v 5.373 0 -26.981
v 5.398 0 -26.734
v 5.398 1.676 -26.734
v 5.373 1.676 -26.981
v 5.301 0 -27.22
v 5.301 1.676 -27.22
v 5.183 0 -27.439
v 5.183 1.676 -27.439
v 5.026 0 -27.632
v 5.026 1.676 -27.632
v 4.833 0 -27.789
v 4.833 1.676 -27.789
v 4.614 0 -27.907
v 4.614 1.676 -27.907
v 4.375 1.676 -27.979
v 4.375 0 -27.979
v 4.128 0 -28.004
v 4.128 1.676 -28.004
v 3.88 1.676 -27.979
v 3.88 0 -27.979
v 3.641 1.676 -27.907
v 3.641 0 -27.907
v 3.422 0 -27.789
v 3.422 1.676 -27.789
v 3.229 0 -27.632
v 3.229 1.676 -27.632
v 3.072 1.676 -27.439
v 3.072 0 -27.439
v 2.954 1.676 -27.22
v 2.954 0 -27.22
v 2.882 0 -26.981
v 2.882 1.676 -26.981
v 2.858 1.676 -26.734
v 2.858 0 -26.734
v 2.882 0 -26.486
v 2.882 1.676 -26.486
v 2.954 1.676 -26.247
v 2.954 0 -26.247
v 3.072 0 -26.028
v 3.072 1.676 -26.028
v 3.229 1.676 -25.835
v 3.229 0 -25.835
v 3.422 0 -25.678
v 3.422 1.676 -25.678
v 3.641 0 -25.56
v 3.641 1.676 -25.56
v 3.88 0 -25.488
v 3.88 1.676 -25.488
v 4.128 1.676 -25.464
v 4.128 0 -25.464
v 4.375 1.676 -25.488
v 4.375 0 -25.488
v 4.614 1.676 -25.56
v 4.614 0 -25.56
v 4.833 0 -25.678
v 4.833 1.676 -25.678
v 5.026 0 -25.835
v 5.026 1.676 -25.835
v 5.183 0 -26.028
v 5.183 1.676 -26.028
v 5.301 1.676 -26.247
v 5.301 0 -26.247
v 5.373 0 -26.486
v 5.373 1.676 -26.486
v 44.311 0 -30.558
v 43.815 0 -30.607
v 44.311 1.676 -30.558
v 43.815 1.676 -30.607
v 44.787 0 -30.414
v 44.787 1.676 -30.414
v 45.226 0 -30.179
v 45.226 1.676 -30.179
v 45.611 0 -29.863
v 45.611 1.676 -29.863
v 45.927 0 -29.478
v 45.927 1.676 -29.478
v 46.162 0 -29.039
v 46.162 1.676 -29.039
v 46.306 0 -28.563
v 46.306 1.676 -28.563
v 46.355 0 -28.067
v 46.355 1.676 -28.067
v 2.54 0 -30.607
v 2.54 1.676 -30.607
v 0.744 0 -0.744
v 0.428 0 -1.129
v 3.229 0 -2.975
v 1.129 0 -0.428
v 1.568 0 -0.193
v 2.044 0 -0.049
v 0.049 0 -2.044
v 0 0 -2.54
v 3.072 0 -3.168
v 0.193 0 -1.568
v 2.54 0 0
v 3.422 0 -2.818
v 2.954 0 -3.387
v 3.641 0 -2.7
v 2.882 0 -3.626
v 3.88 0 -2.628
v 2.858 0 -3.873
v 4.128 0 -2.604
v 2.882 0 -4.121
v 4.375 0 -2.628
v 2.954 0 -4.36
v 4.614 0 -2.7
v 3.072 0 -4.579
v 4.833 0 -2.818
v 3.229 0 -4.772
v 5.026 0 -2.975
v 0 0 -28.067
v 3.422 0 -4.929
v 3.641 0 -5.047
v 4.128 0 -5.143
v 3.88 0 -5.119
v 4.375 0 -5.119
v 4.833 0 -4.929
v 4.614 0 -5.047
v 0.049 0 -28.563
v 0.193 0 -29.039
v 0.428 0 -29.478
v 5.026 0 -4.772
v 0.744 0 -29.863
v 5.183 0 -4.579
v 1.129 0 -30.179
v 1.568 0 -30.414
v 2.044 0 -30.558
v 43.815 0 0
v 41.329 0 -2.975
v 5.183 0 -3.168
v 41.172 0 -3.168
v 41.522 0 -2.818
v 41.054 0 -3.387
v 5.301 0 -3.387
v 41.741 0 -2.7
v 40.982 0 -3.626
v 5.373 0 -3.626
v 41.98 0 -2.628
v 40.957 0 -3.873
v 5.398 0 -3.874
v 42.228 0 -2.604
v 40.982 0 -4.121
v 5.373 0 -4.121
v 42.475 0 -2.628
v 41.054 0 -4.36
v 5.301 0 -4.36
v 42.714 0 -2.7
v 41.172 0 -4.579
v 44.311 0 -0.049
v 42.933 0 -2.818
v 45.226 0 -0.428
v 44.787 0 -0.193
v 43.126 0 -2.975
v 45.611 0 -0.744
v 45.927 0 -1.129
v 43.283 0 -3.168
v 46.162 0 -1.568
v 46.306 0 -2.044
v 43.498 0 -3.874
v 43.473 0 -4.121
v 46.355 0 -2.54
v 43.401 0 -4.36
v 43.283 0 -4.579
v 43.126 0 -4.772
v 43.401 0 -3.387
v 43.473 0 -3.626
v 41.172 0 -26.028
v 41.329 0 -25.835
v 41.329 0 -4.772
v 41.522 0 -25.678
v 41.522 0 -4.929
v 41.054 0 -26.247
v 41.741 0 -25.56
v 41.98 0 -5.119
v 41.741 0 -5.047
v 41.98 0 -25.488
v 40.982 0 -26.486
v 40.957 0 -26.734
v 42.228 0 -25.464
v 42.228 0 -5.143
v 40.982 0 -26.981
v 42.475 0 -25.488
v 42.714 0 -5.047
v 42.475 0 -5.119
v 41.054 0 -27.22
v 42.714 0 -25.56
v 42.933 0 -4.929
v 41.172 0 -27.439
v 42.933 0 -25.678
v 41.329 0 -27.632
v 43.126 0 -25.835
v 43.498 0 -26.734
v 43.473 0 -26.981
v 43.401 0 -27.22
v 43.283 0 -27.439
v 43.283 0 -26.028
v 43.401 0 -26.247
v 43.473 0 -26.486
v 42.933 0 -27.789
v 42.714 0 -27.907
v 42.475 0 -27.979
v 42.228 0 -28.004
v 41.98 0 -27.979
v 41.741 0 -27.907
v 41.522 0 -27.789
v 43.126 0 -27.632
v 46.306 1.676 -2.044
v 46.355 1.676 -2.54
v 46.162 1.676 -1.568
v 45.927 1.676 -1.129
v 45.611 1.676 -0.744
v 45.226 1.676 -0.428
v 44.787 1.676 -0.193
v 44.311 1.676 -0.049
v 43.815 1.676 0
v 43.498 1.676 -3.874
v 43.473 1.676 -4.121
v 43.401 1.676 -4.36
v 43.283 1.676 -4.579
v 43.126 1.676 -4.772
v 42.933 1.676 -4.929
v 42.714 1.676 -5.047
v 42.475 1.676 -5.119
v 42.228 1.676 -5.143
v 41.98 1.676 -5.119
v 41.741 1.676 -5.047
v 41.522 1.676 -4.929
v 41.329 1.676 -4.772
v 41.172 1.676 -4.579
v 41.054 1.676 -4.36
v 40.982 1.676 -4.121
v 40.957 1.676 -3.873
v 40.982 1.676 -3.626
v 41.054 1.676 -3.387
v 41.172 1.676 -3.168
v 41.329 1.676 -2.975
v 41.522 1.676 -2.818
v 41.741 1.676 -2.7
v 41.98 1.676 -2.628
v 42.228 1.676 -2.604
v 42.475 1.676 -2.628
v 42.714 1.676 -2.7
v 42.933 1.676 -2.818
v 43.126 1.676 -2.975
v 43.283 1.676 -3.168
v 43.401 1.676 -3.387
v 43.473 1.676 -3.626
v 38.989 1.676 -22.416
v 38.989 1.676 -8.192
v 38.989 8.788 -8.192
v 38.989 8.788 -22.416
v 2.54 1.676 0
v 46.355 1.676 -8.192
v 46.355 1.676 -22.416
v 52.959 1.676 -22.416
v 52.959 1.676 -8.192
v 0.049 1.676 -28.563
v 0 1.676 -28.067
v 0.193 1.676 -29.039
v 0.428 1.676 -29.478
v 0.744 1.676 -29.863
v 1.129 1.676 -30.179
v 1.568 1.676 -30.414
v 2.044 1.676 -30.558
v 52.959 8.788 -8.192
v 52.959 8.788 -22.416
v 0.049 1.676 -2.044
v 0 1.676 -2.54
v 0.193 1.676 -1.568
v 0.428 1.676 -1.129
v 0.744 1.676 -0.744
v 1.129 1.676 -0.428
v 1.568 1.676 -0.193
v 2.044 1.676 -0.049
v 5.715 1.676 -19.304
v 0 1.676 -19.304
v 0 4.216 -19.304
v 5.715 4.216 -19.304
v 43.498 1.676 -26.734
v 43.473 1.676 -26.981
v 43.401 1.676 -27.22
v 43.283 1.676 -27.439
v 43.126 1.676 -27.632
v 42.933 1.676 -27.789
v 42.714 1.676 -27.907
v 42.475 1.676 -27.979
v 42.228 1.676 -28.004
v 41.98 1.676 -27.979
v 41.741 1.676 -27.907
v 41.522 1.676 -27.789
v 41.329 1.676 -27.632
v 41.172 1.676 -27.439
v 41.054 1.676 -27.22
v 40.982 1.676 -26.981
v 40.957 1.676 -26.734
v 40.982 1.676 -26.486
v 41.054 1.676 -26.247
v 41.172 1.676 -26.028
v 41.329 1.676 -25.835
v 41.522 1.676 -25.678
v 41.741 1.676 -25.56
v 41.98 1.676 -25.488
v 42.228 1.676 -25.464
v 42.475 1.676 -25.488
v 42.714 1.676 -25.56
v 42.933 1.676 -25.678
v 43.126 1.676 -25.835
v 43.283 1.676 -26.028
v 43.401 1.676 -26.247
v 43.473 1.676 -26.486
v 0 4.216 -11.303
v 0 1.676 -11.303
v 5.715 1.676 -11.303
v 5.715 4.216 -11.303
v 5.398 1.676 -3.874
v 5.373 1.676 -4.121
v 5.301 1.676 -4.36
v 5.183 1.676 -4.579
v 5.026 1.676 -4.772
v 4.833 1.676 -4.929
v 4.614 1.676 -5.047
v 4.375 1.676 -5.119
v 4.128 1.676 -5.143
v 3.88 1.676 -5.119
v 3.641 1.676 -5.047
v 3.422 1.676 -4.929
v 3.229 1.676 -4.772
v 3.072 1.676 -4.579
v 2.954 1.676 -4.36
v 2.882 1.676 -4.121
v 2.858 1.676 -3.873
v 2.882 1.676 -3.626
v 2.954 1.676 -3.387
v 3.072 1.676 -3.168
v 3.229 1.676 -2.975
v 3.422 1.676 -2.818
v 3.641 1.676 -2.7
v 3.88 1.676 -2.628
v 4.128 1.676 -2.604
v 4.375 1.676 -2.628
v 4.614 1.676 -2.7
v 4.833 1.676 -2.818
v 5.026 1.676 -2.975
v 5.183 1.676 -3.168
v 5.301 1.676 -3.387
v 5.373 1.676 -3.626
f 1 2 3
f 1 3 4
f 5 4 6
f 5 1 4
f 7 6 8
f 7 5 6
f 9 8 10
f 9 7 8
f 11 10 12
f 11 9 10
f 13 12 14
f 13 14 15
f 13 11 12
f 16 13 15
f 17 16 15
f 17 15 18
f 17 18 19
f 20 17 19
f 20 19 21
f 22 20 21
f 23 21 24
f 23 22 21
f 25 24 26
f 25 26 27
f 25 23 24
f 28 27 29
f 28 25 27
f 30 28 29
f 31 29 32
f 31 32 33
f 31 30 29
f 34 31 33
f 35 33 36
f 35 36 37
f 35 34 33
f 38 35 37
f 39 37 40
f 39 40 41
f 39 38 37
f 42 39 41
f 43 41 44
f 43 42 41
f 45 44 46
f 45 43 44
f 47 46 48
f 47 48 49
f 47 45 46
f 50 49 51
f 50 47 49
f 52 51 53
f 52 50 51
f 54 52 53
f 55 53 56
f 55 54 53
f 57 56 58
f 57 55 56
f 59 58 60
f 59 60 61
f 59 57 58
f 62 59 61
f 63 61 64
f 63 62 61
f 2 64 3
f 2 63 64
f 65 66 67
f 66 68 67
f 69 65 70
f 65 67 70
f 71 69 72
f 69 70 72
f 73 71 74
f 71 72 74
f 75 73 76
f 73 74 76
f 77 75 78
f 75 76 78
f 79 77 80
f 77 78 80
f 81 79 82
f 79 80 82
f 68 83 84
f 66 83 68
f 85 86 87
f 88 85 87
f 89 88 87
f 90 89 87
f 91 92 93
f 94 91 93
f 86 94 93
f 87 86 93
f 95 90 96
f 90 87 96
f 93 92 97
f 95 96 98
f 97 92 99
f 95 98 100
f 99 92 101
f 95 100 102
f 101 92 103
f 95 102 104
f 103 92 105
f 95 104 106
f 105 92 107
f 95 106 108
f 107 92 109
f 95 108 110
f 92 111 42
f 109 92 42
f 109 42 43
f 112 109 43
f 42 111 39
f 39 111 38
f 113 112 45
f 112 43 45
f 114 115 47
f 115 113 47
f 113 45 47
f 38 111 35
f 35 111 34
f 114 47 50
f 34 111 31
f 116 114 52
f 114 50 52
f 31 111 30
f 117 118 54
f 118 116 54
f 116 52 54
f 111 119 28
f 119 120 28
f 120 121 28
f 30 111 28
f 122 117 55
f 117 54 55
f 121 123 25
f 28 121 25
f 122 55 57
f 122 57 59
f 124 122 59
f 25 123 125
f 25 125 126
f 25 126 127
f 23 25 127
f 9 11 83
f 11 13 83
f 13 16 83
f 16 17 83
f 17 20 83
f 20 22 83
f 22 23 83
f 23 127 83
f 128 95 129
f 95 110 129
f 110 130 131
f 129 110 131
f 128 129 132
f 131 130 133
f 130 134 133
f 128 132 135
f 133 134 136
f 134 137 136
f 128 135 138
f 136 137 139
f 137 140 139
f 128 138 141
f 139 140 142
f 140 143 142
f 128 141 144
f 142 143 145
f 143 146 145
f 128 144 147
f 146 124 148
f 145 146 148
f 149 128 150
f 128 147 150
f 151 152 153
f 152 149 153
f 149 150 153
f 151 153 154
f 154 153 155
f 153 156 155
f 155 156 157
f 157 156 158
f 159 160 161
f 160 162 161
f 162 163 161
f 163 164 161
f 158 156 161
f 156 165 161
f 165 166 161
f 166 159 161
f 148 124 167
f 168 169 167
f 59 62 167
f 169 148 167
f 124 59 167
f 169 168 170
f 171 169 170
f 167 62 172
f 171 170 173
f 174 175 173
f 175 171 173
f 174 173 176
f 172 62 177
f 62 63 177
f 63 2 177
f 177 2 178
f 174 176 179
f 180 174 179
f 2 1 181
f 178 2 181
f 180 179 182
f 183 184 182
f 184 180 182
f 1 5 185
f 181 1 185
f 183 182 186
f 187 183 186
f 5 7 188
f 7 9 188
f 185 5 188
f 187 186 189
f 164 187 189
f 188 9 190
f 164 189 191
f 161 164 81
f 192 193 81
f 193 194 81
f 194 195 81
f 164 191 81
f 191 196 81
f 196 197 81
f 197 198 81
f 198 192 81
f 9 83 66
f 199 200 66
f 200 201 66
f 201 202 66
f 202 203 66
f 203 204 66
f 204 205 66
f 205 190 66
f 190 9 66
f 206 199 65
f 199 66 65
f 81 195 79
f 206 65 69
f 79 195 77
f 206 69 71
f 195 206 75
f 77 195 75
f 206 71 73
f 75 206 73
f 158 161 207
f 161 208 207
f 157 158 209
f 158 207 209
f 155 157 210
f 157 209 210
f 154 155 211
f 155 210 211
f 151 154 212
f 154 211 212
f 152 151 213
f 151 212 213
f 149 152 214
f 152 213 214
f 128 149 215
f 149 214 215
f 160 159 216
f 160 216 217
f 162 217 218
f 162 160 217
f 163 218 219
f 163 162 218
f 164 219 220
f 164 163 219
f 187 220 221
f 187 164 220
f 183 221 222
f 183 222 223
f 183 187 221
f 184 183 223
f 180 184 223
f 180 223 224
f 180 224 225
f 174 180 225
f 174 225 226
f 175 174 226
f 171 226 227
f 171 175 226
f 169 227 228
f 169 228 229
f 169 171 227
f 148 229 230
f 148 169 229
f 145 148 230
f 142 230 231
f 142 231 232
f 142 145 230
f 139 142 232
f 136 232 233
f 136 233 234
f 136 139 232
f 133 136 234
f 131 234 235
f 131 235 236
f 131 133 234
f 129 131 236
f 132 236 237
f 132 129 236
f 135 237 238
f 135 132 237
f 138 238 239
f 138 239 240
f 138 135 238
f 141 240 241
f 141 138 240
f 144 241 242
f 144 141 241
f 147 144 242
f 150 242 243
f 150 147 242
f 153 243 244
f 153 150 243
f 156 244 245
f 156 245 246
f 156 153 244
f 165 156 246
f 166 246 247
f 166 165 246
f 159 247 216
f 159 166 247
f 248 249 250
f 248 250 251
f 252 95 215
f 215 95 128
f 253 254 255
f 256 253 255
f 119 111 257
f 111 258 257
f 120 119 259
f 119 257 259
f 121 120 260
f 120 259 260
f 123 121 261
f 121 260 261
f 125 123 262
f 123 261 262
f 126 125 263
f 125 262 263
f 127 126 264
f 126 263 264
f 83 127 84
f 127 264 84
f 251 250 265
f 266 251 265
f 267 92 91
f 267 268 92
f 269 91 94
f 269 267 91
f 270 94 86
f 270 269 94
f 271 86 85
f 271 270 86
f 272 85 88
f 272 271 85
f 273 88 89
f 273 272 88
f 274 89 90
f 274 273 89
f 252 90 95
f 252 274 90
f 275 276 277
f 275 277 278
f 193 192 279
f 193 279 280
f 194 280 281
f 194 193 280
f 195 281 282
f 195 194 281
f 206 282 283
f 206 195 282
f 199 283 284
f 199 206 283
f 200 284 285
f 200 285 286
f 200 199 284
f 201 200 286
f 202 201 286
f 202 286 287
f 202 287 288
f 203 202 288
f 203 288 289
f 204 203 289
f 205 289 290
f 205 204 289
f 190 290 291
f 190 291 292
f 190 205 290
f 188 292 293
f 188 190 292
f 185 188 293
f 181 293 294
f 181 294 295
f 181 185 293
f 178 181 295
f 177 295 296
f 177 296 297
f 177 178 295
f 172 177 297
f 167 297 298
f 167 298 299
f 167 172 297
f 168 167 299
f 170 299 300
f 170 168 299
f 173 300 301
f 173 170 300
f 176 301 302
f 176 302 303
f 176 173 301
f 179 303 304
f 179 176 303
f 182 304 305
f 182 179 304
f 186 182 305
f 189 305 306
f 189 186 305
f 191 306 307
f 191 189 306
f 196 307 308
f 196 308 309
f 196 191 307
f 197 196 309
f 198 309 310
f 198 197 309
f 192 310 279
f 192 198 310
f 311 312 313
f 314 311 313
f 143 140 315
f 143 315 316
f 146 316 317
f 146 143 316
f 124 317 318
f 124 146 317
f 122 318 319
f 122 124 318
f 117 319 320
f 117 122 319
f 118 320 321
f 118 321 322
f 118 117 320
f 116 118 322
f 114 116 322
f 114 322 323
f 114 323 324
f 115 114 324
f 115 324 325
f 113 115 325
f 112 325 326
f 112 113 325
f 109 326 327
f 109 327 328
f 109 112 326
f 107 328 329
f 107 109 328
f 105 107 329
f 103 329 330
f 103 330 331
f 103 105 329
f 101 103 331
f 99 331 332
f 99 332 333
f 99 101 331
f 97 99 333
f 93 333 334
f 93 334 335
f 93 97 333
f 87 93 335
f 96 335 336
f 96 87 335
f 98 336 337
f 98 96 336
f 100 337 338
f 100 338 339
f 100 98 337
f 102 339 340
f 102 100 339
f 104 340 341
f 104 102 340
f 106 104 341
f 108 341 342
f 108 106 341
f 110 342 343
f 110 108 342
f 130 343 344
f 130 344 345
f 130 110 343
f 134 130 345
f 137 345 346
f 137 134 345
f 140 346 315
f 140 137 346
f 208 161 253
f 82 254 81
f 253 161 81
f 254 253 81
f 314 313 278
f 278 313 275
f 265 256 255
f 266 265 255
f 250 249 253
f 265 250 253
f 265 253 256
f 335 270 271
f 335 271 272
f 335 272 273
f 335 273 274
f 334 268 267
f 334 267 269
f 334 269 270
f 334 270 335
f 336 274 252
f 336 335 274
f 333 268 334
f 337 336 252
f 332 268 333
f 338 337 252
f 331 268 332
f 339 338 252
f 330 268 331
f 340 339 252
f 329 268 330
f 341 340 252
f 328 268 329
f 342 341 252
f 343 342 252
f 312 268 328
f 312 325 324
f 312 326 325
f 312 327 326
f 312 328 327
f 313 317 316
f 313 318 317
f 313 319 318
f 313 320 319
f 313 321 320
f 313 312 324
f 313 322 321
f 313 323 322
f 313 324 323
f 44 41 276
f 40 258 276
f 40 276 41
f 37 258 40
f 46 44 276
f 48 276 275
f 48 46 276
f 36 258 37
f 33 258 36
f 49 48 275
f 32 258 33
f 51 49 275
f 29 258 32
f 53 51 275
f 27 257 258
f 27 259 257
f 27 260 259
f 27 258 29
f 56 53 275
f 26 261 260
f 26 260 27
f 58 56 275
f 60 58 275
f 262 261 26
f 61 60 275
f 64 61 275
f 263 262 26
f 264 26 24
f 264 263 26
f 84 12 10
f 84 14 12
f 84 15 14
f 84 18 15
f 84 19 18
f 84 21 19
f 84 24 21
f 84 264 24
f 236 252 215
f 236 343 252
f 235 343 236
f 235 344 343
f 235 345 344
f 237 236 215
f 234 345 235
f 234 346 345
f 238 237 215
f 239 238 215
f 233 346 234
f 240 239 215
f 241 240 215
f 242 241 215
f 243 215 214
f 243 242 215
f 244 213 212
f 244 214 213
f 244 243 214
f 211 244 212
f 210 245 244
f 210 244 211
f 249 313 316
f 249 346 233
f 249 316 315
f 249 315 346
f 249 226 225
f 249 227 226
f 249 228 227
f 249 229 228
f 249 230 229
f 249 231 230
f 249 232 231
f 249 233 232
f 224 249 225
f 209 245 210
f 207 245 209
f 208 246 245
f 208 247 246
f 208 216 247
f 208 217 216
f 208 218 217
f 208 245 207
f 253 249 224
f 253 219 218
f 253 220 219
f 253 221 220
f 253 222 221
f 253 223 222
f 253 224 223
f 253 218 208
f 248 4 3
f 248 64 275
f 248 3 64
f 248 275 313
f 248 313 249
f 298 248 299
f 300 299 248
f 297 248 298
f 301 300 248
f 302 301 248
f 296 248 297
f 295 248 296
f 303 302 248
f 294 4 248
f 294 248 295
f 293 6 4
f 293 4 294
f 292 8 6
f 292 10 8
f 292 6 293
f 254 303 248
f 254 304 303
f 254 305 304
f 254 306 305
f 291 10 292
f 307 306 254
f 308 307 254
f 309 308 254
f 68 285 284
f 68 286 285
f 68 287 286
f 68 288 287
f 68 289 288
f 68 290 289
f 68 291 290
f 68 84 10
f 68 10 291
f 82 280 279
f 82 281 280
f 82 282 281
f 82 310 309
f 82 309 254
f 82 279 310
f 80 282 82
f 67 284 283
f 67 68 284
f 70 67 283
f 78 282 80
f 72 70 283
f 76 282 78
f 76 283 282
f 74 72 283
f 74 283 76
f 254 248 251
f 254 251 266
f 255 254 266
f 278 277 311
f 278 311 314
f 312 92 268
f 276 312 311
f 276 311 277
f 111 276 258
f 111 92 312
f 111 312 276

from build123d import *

# Parameters (mm, degrees)
SKETCH1_W           = 46.355
SKETCH1_H           = 30.607
SKETCH1_R           = 1.27
BOSS_EXTRUDE1_DEPTH = 1.6764
SKETCH2_W           = 13.97
SKETCH2_H           = 14.224
BOSS_EXTRUDE2_DEPTH = 7.112
SKETCH3_W           = 5.715
SKETCH3_H           = 8.001
BOSS_EXTRUDE3_DEPTH = 2.54
FILLET1_R           = 2.54


with BuildPart() as part:
    # Sketch1 → Boss-Extrude1 (new body)
    with BuildSketch(Plane(origin=(0, 0, 0), x_dir=(1, 0, 0), z_dir=(0, 1, 0))):
        with Locations((23.1775, 15.3035)):
            Rectangle(SKETCH1_W, SKETCH1_H)
        with Locations((4.1275, 26.7335)):
            Circle(SKETCH1_R, mode=Mode.SUBTRACT)
        with Locations((42.2275, 26.7335)):
            Circle(SKETCH1_R, mode=Mode.SUBTRACT)
        with Locations((4.1275, 3.8735)):
            Circle(SKETCH1_R, mode=Mode.SUBTRACT)
        with Locations((42.2275, 3.8735)):
            Circle(SKETCH1_R, mode=Mode.SUBTRACT)
    extrude(amount=BOSS_EXTRUDE1_DEPTH)

    # Sketch2 → Boss-Extrude2 (add)
    with BuildSketch(Plane(origin=(0, 1.6764, 0), x_dir=(1, 0, 0), z_dir=(0, 1, 0))):
        with Locations((45.974, 15.3035)):
            Rectangle(SKETCH2_W, SKETCH2_H)
    extrude(amount=BOSS_EXTRUDE2_DEPTH)

    # Sketch3 → Boss-Extrude3 (add)
    with BuildSketch(Plane(origin=(0, 1.6764, 0), x_dir=(1, 0, 0), z_dir=(0, 1, 0))):
        with Locations((2.8575, 15.3035)):
            Rectangle(SKETCH3_W, SKETCH3_H)
    extrude(amount=BOSS_EXTRUDE3_DEPTH)

    # Fillet1
    fillet1_edges = [part.edges().sort_by_distance(p)[0] for p in [
        (0, 0.8382, -30.607),
        (46.355, 0.8382, -30.607),
        (46.355, 0.8382, 0),
        (0, 0.8382, 0),
    ]]
    fillet(fillet1_edges, radius=FILLET1_R)


solid = part.part
